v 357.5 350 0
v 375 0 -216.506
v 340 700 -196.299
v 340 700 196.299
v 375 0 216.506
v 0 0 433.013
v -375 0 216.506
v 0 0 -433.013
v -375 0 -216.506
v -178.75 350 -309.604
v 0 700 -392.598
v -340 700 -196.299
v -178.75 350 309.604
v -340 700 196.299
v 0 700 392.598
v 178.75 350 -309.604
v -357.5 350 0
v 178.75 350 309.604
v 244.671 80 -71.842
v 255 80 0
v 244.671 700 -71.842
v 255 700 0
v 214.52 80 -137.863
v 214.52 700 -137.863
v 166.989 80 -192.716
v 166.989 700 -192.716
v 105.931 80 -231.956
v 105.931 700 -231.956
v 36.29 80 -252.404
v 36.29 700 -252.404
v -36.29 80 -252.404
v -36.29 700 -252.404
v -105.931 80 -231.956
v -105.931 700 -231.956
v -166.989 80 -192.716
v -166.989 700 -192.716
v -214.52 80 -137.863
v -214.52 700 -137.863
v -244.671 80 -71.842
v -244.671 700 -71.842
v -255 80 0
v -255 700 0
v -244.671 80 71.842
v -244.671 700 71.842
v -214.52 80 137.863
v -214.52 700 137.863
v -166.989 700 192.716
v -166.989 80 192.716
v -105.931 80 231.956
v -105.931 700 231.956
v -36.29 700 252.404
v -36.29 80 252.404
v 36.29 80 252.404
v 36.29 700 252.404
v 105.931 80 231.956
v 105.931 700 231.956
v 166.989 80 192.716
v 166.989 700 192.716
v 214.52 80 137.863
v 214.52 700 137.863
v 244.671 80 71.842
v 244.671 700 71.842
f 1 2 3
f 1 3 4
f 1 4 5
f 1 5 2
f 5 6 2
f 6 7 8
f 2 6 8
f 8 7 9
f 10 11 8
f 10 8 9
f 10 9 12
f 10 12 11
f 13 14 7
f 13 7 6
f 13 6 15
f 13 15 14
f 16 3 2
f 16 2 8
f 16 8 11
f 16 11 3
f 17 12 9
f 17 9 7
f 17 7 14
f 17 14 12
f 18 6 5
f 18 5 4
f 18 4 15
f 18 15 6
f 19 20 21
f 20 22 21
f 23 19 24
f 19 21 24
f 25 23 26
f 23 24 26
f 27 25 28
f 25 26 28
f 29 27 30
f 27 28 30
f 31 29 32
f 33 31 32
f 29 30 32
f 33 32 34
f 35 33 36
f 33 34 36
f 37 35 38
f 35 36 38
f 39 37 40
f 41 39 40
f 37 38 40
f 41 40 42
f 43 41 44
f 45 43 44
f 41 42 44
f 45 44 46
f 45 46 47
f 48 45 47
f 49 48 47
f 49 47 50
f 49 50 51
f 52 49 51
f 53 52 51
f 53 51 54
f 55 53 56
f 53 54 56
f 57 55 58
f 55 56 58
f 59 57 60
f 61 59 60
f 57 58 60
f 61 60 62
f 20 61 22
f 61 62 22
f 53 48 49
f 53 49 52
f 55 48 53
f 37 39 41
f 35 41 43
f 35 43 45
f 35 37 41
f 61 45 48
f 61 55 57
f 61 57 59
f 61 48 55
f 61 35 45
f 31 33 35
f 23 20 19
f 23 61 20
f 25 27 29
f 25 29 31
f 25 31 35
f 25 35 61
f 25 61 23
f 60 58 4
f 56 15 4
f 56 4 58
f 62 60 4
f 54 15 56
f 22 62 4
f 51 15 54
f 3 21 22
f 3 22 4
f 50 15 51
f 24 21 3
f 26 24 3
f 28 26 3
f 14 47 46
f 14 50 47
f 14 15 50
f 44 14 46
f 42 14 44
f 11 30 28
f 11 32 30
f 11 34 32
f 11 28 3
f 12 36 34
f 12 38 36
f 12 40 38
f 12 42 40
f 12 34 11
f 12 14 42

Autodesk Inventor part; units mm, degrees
ref_plane "YZ Plane" through (0, 0, 0) normal (1, 0, 0) x (0, 1, 0)
ref_plane "XY Plane" through (0, 0, 0) normal (0, 0, 1) x (1, 0, 0)
sketch "Sketch1" plane through (0, 0, 0) normal (0, 1, 0) x (-1, 0, 0)
  line L0 (0, -433.0127) -> (-375, -216.5064)
  line L1 (-375, -216.5064) -> (-375, 216.5064)
  line L2 (-375, 216.5064) -> (0, 433.0127)
  line L3 (0, 433.0127) -> (375, 216.5064)
  line L4 (375, 216.5064) -> (375, -216.5064)
  line L5 (375, -216.5064) -> (0, -433.0127)
  line L6 (0, -606.2178) -> (0, 606.2178) projected
  point P0 (0, 0)
  point P1 (0, 0)
  dimension "d0" = 750
ref_plane "Work Plane1" through (0, 700, 0) normal (0, 1, 0) x (-1, 0, 0)
sketch "Sketch2" plane through (0, 700, 0) normal (0, 1, 0) x (-1, 0, 0)
  line L0 (0, -392.5982) -> (-340, -196.2991)
  line L1 (-340, -196.2991) -> (-340, 196.2991)
  line L2 (-340, 196.2991) -> (0, 392.5982)
  line L3 (0, 392.5982) -> (340, 196.2991)
  line L4 (340, 196.2991) -> (340, -196.2991)
  line L5 (340, -196.2991) -> (0, -392.5982)
  point P0 (0, 0)
  point P1 (0, 0)
  dimension "d2" = 680
loft "Loft1" add profiles "Sketch1", "Sketch2"
sketch "Sketch3" plane through (340, 700, 196.2991) normal (0, 1, 0) x (1, 0, 0)
  circle A0 centre (-340, 196.2991) radius 255
  dimension "d7" = 510
extrude "Extrusion1" cut sketch "Sketch3" against normal blind 620
properties part number "smietnik1" material "Concrete"
